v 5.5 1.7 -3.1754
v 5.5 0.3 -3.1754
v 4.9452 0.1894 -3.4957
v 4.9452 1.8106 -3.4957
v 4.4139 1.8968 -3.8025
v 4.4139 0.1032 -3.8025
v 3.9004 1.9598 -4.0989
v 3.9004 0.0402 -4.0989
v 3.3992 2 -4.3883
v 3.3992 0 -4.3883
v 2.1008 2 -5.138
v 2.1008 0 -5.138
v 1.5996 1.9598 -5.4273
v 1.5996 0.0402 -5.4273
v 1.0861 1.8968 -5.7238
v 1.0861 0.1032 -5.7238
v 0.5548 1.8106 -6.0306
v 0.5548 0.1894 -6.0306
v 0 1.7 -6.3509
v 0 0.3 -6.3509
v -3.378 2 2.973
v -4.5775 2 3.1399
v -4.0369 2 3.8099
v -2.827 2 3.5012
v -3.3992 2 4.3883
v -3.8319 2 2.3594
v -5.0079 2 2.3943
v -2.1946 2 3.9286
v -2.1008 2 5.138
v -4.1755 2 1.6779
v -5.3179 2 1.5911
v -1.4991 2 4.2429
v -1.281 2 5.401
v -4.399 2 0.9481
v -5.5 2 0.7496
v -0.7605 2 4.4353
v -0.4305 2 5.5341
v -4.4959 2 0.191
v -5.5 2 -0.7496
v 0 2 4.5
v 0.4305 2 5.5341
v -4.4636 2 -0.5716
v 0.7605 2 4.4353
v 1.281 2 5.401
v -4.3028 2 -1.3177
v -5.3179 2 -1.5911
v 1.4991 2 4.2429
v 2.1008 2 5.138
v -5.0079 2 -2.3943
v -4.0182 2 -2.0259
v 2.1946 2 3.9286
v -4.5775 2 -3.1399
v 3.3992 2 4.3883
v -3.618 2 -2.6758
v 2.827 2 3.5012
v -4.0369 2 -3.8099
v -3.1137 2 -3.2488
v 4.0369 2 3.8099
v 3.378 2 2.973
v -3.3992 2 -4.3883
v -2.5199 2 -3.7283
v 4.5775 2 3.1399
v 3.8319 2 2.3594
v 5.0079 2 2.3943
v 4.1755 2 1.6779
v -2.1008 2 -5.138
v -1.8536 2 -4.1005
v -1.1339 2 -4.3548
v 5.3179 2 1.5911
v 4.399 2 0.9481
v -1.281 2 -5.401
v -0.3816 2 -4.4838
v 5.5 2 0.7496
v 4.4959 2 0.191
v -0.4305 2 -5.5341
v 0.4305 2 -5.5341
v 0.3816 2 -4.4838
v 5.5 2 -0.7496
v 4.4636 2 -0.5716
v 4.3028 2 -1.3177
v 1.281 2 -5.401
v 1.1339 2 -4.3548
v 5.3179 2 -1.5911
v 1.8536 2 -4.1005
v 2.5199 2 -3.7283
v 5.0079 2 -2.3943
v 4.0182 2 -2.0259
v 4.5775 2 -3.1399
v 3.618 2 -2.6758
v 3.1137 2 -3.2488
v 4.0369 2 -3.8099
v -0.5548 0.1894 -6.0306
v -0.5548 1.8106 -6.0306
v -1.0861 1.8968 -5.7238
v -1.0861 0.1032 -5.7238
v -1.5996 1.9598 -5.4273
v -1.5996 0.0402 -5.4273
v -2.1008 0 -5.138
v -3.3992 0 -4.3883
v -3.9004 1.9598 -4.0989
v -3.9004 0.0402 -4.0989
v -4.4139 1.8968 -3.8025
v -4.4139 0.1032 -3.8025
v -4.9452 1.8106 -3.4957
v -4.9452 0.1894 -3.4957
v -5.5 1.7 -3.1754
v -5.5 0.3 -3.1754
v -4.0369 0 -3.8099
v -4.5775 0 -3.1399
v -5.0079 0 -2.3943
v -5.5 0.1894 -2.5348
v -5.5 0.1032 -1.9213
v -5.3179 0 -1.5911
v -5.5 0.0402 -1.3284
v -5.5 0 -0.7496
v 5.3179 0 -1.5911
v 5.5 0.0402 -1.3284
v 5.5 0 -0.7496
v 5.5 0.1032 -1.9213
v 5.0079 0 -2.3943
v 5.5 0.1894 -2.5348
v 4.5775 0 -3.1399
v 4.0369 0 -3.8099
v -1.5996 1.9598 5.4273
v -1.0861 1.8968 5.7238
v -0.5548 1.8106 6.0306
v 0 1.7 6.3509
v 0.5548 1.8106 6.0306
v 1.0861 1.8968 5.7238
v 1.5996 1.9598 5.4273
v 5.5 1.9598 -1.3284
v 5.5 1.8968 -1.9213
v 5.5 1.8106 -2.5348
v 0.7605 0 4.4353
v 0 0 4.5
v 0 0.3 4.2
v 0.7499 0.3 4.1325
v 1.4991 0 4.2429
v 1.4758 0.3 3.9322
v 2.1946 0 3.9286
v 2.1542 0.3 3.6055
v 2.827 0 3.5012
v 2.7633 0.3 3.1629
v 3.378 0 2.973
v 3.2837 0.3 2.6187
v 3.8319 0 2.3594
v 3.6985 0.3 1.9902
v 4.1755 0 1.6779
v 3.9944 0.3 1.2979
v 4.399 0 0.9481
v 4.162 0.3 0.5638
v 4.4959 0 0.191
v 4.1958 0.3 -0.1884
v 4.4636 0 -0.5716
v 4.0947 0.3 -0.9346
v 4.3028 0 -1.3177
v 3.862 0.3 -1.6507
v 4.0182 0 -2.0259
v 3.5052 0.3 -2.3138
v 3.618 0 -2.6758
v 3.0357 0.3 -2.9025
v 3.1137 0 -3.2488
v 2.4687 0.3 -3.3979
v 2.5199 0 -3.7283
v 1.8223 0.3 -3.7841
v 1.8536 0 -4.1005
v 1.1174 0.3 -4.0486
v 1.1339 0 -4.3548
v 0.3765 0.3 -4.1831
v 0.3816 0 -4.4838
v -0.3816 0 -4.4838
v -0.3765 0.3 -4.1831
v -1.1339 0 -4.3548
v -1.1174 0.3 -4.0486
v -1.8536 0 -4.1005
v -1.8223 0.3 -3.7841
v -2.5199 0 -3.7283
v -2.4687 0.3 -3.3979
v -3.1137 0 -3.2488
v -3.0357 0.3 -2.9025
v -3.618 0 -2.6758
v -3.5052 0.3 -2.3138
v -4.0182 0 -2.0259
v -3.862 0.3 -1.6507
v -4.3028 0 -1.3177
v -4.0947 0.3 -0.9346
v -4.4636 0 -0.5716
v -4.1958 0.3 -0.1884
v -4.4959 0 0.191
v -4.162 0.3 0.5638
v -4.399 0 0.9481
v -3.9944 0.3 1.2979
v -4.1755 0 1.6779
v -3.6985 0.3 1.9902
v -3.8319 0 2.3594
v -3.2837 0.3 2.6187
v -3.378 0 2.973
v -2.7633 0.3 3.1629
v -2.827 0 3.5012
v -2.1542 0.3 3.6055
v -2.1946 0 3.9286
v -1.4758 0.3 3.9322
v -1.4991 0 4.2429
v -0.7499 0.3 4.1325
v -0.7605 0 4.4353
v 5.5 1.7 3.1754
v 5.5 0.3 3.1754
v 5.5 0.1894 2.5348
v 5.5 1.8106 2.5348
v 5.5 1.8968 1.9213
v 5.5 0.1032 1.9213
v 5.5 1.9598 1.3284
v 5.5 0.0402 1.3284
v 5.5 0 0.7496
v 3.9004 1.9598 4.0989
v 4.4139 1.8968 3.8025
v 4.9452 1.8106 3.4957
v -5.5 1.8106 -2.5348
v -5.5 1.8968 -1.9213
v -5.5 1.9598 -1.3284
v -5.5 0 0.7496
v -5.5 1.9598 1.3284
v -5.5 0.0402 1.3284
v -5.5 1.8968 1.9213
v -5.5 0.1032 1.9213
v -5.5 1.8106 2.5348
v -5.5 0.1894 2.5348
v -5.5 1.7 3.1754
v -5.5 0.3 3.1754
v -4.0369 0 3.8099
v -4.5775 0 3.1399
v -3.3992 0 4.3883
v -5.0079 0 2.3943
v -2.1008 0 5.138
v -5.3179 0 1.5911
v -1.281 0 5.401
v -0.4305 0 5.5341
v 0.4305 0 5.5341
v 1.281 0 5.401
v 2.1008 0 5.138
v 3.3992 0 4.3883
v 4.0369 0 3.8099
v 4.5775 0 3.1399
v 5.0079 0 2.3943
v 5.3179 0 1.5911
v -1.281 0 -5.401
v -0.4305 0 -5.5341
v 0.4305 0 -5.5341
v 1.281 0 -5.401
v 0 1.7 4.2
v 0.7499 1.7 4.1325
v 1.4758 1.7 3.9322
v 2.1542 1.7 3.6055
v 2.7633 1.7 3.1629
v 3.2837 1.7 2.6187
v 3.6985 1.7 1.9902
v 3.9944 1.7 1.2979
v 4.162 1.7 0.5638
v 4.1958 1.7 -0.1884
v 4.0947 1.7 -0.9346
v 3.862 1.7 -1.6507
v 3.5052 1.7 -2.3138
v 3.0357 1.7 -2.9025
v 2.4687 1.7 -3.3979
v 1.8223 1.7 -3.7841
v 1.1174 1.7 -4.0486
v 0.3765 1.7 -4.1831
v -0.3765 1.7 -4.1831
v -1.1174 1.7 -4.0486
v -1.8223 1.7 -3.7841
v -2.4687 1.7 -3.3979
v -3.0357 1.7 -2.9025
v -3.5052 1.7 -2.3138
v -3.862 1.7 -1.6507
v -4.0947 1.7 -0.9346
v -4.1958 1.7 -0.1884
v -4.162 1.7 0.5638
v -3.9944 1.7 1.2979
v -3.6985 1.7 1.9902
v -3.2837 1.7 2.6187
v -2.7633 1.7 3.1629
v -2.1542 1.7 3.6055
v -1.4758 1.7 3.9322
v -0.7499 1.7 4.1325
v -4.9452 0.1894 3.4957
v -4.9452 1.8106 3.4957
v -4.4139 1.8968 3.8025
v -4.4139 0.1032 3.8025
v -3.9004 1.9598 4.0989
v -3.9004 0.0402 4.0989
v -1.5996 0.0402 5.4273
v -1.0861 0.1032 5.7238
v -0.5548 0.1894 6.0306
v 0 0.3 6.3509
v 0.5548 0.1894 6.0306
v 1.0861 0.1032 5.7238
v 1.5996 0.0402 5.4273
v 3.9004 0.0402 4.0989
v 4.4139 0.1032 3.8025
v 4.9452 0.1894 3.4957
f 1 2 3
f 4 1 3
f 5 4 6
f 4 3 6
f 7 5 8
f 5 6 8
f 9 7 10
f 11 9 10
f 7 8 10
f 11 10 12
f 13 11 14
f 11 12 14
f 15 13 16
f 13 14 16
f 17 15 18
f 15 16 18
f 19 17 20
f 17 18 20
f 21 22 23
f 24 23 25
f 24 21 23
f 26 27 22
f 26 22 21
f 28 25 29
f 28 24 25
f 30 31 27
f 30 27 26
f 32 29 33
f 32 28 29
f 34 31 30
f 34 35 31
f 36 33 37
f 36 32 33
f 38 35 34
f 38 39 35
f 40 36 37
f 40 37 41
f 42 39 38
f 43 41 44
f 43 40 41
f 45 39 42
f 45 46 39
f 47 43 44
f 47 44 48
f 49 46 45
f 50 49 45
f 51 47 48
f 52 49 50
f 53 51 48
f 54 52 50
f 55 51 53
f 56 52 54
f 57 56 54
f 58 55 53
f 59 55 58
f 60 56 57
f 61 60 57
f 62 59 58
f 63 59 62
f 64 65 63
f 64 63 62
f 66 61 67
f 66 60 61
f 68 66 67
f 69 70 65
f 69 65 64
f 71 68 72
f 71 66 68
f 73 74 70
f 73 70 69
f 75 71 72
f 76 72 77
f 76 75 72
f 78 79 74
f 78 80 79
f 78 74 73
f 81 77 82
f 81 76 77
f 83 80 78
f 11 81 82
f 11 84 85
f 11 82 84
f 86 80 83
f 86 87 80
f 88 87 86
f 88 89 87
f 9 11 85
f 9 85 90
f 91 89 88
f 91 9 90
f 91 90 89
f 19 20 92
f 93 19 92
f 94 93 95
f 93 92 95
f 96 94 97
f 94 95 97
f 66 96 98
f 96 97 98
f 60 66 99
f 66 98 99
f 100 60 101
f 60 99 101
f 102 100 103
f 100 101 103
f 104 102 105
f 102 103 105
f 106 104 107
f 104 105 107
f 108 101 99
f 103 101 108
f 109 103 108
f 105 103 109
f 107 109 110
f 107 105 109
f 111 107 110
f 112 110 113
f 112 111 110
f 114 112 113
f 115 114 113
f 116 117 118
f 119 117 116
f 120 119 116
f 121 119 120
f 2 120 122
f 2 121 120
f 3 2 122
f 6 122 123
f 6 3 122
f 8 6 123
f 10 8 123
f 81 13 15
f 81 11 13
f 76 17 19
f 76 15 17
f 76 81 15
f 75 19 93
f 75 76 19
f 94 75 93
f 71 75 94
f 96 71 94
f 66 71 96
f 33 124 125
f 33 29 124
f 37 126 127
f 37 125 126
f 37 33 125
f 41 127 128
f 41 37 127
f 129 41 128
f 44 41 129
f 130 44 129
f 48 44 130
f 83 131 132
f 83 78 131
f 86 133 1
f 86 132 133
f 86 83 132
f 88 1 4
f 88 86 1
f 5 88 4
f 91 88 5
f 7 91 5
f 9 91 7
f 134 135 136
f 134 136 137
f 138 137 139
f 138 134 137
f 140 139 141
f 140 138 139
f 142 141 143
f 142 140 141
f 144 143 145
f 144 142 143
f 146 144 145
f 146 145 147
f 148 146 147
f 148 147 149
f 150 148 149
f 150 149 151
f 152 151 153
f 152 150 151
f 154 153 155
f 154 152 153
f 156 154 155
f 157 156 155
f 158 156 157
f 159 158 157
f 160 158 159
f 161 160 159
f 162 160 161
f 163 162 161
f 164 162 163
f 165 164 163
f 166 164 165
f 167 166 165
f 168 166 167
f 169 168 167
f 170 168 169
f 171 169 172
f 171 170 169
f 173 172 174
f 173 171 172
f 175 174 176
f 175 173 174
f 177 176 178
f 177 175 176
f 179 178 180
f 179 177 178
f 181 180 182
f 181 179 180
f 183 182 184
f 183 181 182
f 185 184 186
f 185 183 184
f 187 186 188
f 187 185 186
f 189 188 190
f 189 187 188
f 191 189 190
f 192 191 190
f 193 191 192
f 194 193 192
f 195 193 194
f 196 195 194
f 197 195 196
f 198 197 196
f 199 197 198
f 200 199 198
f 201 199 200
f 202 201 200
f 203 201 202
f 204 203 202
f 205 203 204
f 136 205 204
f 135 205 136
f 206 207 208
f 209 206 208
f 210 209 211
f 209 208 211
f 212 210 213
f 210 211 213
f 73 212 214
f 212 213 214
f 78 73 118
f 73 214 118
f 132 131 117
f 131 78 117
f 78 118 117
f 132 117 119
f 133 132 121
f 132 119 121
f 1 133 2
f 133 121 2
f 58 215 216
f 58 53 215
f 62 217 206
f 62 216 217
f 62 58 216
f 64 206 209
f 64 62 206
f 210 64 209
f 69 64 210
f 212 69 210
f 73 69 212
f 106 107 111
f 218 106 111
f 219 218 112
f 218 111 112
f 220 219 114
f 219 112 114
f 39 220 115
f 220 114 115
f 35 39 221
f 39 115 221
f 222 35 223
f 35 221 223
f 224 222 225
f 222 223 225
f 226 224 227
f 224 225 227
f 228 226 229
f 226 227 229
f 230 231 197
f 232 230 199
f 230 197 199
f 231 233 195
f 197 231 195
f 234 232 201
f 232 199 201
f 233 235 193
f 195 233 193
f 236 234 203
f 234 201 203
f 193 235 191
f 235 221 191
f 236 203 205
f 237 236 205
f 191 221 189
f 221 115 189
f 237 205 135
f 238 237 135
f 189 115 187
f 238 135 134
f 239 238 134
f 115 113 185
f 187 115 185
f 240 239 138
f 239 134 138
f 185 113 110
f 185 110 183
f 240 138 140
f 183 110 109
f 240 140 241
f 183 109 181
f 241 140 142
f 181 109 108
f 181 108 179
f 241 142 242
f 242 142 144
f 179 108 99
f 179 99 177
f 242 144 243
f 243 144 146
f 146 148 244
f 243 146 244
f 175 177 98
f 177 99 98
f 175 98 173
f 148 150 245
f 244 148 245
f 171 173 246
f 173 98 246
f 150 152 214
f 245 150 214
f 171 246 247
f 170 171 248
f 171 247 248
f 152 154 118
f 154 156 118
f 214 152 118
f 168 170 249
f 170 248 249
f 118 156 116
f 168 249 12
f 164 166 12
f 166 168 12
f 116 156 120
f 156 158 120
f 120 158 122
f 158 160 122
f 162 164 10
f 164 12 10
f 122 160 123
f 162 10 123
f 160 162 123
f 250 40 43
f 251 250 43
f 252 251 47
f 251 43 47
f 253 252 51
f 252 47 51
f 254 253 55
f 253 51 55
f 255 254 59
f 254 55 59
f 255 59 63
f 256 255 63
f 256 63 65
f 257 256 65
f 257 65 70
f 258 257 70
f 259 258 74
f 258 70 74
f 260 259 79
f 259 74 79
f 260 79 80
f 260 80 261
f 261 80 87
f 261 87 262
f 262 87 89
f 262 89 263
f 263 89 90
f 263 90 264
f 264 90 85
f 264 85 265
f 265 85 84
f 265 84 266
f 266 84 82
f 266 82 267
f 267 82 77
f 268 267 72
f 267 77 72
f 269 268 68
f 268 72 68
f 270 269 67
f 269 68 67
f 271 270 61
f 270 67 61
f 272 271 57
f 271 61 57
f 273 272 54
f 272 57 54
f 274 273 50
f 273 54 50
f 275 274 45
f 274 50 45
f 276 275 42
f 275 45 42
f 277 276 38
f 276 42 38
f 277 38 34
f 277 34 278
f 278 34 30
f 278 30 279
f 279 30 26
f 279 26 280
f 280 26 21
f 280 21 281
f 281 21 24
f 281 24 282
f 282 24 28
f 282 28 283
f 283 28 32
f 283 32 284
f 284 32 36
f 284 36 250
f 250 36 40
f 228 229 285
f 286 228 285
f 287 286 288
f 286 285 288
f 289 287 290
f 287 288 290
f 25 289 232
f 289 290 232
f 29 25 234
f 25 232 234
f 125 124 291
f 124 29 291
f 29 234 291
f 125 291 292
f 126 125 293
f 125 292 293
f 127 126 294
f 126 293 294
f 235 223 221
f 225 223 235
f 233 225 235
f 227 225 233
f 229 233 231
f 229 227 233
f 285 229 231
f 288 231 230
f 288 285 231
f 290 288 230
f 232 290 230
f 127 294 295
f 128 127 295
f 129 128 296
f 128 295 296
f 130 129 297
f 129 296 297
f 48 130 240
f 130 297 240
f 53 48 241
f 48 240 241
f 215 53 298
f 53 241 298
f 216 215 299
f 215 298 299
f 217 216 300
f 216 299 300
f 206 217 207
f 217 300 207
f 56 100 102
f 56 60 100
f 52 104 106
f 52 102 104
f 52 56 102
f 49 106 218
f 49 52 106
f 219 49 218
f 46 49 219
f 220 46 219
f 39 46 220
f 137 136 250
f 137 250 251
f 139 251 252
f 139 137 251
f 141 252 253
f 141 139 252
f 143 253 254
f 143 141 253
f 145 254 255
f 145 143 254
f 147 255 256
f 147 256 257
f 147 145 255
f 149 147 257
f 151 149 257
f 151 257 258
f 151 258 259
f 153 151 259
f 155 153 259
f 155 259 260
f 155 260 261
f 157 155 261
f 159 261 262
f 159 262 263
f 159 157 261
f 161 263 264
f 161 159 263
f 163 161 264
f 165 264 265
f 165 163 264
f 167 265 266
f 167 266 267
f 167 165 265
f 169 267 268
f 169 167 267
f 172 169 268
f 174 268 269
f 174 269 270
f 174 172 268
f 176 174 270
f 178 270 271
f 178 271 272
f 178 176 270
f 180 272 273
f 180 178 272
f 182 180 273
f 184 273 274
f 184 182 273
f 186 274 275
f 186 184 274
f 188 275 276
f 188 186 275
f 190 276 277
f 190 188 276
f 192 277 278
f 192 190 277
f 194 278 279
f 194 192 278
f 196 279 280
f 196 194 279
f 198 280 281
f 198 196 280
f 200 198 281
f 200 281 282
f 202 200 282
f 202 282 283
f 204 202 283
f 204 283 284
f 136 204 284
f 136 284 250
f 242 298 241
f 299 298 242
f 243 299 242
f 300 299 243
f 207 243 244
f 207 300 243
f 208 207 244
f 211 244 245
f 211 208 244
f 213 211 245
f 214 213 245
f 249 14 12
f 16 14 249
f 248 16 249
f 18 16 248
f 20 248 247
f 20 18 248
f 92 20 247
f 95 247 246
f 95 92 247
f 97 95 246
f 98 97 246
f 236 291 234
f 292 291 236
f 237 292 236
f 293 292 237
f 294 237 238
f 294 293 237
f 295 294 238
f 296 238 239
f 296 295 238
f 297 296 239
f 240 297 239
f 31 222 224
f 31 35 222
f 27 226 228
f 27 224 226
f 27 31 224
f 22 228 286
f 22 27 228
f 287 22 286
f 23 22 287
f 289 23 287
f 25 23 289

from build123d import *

# Parameters (mm, degrees)
SKETCH1_R           = 4.2
BOSS_EXTRUDE1_DEPTH = 2
CHAMFER1_SIZE       = 0.3


with BuildPart() as part:
    # Sketch1 → Boss-Extrude1 (new body)
    with BuildSketch(Plane(origin=(0, 0, 0), x_dir=(1, 0, 0), z_dir=(0, 1, 0))):
        Polygon((0, 6.350852961), (-5.5, 3.175426481), (-5.5, -3.175426481), (0, -6.350852961), (5.5, -3.175426481), (5.5, 3.175426481), align=None)
        with Locations(Location((0, 0, 0), (0, 0, 270))):
            Circle(SKETCH1_R, mode=Mode.SUBTRACT)
    extrude(amount=BOSS_EXTRUDE1_DEPTH)

    # Chamfer1
    chamfer1_edges = [part.edges().sort_by_distance(p)[0] for p in [
        (0, 0, -4.2),
        (0, 2, -4.2),
    ]]
    chamfer(chamfer1_edges, length=CHAMFER1_SIZE)

    # Sketch3 → Cut-Revolve1 (revolve, cut)
    with BuildSketch(Plane(origin=(0, 0, 0), x_dir=(0, 0, -1), z_dir=(1, 0, 0))):
        Polygon((-6.350852961, 0), (-5.550852961, 0), (-6.350852961, 0.3), align=None)
        Polygon((-6.350852961, 2), (-6.350852961, 1.7), (-5.550852961, 2), align=None)
    revolve(axis=Axis((0, 0, 0), (0, 1, 0)), mode=Mode.SUBTRACT)


solid = part.part
